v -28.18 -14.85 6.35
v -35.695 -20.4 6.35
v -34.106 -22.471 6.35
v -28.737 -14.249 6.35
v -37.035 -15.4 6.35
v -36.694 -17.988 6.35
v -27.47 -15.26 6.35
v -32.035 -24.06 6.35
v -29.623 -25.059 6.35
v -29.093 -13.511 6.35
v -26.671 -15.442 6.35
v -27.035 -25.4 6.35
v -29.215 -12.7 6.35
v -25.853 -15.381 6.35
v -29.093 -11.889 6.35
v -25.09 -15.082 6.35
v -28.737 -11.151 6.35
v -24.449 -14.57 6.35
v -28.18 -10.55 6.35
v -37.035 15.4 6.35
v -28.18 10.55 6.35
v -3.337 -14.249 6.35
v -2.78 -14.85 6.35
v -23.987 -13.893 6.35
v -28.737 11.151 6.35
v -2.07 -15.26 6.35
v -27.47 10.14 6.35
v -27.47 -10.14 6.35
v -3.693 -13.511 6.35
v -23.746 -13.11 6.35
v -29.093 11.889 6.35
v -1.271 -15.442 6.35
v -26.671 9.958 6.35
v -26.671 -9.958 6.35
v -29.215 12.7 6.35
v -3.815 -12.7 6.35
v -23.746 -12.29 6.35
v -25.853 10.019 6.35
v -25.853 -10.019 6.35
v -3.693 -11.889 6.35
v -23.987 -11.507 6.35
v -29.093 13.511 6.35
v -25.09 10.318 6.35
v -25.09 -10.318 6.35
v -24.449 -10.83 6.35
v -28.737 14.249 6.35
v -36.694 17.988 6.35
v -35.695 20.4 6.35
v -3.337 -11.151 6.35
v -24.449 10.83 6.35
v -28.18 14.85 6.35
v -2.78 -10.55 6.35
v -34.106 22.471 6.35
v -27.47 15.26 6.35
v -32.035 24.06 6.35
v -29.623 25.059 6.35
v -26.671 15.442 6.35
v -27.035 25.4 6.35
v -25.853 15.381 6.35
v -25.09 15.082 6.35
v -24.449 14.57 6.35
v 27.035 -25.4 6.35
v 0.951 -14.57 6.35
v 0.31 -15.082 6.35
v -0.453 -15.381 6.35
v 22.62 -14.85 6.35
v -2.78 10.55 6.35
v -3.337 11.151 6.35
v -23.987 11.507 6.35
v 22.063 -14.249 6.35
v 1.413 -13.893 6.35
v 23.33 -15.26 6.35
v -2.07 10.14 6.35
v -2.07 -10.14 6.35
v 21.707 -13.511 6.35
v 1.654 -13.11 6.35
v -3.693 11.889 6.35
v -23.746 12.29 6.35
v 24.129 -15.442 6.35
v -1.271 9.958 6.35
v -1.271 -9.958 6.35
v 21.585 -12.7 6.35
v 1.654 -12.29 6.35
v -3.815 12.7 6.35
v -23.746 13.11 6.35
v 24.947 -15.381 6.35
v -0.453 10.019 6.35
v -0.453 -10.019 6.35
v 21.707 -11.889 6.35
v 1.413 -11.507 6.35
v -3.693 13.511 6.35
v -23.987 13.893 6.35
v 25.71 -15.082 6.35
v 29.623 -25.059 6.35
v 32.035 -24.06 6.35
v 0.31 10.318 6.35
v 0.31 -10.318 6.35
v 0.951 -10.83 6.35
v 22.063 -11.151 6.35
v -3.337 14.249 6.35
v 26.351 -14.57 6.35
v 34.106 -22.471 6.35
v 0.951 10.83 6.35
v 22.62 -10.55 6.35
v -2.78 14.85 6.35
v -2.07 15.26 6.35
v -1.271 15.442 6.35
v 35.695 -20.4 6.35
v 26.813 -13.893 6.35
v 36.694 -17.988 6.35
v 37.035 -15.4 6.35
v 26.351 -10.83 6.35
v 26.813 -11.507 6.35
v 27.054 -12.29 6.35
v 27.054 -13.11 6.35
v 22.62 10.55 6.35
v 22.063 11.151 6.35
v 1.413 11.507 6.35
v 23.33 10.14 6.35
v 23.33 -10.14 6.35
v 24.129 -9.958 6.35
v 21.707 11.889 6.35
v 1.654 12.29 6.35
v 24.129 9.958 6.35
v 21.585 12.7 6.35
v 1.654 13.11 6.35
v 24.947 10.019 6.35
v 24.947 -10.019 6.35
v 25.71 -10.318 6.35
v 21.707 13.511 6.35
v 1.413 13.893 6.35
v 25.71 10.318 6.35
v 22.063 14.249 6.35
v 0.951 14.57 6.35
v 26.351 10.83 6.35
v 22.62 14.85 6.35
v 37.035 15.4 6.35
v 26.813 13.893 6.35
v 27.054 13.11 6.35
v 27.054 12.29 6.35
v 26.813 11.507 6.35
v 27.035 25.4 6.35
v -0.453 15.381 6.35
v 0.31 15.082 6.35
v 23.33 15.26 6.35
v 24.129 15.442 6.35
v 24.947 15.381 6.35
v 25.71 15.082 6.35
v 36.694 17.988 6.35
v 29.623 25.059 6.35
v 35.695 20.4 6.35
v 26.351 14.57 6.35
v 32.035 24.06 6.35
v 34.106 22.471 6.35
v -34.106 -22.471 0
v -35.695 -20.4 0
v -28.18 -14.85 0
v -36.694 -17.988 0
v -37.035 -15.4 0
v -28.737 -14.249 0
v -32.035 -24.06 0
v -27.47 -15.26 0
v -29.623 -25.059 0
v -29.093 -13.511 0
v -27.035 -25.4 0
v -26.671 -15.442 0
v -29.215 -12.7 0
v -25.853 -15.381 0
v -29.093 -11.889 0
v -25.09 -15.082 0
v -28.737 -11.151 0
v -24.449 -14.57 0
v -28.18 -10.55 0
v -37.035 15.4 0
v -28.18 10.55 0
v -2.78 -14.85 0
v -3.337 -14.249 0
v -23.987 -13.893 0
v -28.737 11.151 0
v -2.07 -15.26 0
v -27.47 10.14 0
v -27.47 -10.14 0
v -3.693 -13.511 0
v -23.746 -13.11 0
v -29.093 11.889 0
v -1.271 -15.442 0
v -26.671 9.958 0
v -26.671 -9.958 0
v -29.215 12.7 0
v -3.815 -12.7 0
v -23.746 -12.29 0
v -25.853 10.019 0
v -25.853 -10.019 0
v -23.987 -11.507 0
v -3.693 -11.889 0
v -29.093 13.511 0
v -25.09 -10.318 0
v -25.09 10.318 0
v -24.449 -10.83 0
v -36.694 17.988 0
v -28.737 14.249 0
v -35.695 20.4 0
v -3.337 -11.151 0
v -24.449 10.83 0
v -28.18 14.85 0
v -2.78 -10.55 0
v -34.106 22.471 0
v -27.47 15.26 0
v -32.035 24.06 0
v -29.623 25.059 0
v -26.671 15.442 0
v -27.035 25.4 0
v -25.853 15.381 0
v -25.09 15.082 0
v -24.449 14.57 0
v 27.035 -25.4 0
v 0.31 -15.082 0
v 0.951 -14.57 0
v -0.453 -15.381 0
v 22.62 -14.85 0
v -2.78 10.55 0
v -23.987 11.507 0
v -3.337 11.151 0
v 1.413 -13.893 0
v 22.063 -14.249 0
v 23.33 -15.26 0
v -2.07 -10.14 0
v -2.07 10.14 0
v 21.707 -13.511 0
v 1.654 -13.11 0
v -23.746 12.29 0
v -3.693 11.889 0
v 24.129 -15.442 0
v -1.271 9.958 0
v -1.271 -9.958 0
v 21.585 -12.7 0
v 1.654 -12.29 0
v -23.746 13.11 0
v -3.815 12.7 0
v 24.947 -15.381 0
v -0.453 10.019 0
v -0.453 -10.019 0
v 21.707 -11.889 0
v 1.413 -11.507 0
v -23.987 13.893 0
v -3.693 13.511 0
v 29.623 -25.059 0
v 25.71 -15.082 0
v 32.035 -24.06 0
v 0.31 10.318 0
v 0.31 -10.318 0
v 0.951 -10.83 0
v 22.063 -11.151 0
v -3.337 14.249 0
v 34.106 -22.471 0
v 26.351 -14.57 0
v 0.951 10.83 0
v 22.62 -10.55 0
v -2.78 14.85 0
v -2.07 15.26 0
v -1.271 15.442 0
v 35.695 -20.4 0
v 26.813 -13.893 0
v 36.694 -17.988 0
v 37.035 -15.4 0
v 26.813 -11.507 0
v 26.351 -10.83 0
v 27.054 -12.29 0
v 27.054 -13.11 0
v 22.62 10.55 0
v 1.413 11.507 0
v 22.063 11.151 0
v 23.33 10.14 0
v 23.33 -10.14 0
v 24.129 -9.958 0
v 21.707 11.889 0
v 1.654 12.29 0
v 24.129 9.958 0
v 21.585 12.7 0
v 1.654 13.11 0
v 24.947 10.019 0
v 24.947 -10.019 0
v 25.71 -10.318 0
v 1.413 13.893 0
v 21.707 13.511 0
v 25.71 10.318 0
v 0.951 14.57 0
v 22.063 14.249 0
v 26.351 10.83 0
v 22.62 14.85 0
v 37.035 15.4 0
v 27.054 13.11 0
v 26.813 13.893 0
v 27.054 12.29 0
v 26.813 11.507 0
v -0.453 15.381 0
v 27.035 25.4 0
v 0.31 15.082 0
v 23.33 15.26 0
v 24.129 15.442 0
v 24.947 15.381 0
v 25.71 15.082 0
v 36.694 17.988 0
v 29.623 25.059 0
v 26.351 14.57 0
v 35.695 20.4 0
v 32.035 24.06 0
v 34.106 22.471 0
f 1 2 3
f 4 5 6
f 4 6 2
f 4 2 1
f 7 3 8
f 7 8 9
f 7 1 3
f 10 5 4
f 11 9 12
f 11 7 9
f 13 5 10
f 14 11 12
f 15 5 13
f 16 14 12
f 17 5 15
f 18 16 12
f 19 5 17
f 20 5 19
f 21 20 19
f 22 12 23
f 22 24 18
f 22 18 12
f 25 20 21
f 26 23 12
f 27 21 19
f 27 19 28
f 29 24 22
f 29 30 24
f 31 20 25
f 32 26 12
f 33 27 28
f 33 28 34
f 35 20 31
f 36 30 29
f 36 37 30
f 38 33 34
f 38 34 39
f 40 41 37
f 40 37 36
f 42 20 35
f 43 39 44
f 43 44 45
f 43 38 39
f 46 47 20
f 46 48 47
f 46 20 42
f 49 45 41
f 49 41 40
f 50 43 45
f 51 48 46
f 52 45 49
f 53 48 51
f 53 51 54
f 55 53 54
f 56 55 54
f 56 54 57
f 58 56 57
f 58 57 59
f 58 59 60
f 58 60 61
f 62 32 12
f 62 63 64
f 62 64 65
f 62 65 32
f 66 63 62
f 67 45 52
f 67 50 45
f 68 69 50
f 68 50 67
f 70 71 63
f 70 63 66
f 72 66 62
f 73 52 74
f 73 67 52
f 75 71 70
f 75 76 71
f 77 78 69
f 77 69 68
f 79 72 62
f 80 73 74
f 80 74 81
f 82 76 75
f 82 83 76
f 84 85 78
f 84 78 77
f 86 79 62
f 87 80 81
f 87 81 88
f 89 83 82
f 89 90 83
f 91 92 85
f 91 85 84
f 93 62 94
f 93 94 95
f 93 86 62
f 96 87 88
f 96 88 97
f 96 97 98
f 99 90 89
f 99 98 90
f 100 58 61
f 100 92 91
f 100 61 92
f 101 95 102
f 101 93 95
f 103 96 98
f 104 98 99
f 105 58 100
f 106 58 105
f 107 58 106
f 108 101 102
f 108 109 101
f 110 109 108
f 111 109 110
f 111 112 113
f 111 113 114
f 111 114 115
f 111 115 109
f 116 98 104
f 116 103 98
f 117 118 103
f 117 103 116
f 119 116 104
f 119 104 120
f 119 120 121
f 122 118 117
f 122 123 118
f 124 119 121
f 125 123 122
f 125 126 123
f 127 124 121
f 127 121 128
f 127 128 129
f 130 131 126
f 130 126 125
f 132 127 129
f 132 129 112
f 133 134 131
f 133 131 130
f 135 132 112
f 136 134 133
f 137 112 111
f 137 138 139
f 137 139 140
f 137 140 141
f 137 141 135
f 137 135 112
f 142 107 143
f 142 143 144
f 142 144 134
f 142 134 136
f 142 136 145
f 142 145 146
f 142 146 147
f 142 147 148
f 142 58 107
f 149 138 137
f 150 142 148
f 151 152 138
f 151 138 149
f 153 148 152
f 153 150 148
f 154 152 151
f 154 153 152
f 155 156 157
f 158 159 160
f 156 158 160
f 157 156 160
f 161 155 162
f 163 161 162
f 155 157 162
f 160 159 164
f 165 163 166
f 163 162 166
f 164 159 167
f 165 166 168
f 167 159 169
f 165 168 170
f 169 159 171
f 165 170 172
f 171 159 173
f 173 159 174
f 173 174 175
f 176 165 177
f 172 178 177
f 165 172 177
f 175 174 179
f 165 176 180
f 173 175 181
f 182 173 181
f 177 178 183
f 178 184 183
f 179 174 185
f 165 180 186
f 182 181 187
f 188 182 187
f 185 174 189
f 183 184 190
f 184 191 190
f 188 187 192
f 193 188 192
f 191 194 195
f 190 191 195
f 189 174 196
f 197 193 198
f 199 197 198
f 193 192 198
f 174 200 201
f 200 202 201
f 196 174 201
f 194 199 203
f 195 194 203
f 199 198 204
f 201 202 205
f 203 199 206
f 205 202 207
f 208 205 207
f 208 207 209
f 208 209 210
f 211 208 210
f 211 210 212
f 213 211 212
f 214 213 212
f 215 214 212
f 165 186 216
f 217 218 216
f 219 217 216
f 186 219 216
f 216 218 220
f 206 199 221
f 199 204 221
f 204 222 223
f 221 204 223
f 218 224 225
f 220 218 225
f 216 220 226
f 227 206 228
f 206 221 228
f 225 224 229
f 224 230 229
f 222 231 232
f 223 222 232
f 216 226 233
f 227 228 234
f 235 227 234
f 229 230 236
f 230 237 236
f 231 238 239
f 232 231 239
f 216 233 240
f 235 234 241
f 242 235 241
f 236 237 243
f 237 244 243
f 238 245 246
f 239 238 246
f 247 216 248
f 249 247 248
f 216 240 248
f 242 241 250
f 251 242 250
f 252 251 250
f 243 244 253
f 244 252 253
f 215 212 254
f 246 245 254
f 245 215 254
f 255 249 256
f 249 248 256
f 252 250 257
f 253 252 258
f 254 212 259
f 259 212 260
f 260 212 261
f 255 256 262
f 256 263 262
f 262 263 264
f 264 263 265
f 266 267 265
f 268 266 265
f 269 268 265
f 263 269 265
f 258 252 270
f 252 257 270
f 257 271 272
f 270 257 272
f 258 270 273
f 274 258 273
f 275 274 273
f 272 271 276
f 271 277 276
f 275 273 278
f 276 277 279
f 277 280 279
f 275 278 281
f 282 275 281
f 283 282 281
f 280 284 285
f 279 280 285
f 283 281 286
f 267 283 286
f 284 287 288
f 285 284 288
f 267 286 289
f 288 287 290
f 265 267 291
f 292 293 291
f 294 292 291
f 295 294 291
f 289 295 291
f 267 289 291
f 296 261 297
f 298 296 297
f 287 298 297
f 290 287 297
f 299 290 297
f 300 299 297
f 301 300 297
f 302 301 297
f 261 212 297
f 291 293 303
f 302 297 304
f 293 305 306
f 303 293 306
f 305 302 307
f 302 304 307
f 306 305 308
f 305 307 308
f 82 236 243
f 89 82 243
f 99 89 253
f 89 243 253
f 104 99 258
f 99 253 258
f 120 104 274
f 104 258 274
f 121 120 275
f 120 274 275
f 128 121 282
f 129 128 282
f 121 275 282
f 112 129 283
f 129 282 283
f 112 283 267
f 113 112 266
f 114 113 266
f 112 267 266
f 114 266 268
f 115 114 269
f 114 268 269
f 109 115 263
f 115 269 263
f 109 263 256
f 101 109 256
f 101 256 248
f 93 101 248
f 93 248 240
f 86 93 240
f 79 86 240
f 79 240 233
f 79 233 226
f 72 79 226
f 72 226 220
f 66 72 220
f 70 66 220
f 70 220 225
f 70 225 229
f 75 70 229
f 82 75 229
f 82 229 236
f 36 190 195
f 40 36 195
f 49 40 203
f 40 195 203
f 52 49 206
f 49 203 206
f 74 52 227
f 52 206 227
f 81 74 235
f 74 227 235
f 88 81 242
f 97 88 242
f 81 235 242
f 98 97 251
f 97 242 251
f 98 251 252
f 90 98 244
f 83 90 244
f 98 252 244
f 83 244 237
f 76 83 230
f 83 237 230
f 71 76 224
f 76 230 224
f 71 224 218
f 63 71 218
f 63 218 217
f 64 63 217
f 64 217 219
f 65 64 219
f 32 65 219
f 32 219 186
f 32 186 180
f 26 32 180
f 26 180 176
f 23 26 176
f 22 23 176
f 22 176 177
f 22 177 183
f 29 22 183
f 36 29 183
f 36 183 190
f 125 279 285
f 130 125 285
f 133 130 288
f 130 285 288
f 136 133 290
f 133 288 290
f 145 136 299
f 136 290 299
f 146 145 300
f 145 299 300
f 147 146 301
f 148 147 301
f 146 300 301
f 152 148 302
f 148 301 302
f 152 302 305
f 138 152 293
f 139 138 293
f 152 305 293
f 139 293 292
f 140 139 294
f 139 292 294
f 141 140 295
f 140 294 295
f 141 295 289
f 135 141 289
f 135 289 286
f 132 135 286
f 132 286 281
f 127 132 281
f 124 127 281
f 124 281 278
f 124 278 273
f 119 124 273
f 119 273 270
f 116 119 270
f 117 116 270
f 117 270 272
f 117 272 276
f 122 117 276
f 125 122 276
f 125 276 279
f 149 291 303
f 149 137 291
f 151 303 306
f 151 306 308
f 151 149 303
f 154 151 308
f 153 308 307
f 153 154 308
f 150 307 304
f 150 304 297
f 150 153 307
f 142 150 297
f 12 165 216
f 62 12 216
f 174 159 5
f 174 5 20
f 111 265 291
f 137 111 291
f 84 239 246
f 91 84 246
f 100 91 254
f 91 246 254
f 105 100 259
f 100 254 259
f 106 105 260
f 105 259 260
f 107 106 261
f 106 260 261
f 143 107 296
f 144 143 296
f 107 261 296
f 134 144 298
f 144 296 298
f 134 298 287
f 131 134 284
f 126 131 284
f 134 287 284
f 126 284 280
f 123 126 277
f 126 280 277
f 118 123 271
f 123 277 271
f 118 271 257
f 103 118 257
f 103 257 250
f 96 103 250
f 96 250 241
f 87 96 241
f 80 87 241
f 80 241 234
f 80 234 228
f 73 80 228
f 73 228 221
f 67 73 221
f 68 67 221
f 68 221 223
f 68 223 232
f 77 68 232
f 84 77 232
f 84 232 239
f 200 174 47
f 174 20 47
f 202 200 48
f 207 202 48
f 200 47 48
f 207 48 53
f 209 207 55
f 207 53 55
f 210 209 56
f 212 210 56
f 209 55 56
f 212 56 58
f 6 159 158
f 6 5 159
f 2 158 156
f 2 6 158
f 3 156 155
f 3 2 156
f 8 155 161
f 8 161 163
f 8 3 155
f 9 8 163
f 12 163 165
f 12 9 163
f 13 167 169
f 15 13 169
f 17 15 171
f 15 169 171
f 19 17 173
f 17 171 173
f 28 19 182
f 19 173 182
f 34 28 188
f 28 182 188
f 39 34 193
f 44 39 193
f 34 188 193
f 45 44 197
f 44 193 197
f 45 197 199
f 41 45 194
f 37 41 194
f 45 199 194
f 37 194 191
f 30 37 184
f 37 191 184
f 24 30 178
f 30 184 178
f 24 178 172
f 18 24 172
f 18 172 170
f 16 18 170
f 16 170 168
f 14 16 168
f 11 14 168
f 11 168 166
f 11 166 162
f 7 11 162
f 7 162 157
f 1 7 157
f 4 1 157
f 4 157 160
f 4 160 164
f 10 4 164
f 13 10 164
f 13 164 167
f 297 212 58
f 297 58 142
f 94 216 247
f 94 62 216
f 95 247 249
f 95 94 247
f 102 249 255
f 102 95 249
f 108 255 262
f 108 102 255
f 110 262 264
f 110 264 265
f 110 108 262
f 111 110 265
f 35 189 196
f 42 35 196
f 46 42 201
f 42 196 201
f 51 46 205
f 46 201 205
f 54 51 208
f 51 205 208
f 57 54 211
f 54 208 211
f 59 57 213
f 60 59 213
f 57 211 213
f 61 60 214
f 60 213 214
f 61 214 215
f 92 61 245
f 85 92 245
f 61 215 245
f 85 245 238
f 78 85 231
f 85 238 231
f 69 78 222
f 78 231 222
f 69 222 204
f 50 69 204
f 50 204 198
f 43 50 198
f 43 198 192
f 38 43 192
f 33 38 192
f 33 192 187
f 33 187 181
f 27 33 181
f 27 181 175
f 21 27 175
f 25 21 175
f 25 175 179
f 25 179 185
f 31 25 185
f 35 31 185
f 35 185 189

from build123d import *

# Parameters (mm, degrees)
SKETCH1_W            = 74.07
SKETCH1_H            = 50.8
BOSS_EXTRUDE1_DEPTH  = 6.35
FILLET1_R            = 10
M5_CLEARANCE_HOLE1_D = 5.5


with BuildPart() as part:
    # Sketch1 → Boss-Extrude1 (new body)
    with BuildSketch(Plane.XY):
        Rectangle(SKETCH1_W, SKETCH1_H)
    extrude(amount=BOSS_EXTRUDE1_DEPTH)

    # Fillet1
    fillet1_edges = [part.edges().sort_by_distance(p)[0] for p in [
        (-37.035, 25.4, 3.175),
        (37.035, 25.4, 3.175),
        (37.035, -25.4, 3.175),
        (-37.035, -25.4, 3.175),
    ]]
    fillet(fillet1_edges, radius=FILLET1_R)

    # M5 Clearance Hole1 (through all)
    with Locations(Plane.XY.offset(6.35)):
        with Locations((-26.465, 12.7), (-26.465, -12.7), (-1.065, -12.7), (-1.065, 12.7), (24.335, 12.7), (24.335, -12.7)):
            Hole(M5_CLEARANCE_HOLE1_D / 2)


solid = part.part
